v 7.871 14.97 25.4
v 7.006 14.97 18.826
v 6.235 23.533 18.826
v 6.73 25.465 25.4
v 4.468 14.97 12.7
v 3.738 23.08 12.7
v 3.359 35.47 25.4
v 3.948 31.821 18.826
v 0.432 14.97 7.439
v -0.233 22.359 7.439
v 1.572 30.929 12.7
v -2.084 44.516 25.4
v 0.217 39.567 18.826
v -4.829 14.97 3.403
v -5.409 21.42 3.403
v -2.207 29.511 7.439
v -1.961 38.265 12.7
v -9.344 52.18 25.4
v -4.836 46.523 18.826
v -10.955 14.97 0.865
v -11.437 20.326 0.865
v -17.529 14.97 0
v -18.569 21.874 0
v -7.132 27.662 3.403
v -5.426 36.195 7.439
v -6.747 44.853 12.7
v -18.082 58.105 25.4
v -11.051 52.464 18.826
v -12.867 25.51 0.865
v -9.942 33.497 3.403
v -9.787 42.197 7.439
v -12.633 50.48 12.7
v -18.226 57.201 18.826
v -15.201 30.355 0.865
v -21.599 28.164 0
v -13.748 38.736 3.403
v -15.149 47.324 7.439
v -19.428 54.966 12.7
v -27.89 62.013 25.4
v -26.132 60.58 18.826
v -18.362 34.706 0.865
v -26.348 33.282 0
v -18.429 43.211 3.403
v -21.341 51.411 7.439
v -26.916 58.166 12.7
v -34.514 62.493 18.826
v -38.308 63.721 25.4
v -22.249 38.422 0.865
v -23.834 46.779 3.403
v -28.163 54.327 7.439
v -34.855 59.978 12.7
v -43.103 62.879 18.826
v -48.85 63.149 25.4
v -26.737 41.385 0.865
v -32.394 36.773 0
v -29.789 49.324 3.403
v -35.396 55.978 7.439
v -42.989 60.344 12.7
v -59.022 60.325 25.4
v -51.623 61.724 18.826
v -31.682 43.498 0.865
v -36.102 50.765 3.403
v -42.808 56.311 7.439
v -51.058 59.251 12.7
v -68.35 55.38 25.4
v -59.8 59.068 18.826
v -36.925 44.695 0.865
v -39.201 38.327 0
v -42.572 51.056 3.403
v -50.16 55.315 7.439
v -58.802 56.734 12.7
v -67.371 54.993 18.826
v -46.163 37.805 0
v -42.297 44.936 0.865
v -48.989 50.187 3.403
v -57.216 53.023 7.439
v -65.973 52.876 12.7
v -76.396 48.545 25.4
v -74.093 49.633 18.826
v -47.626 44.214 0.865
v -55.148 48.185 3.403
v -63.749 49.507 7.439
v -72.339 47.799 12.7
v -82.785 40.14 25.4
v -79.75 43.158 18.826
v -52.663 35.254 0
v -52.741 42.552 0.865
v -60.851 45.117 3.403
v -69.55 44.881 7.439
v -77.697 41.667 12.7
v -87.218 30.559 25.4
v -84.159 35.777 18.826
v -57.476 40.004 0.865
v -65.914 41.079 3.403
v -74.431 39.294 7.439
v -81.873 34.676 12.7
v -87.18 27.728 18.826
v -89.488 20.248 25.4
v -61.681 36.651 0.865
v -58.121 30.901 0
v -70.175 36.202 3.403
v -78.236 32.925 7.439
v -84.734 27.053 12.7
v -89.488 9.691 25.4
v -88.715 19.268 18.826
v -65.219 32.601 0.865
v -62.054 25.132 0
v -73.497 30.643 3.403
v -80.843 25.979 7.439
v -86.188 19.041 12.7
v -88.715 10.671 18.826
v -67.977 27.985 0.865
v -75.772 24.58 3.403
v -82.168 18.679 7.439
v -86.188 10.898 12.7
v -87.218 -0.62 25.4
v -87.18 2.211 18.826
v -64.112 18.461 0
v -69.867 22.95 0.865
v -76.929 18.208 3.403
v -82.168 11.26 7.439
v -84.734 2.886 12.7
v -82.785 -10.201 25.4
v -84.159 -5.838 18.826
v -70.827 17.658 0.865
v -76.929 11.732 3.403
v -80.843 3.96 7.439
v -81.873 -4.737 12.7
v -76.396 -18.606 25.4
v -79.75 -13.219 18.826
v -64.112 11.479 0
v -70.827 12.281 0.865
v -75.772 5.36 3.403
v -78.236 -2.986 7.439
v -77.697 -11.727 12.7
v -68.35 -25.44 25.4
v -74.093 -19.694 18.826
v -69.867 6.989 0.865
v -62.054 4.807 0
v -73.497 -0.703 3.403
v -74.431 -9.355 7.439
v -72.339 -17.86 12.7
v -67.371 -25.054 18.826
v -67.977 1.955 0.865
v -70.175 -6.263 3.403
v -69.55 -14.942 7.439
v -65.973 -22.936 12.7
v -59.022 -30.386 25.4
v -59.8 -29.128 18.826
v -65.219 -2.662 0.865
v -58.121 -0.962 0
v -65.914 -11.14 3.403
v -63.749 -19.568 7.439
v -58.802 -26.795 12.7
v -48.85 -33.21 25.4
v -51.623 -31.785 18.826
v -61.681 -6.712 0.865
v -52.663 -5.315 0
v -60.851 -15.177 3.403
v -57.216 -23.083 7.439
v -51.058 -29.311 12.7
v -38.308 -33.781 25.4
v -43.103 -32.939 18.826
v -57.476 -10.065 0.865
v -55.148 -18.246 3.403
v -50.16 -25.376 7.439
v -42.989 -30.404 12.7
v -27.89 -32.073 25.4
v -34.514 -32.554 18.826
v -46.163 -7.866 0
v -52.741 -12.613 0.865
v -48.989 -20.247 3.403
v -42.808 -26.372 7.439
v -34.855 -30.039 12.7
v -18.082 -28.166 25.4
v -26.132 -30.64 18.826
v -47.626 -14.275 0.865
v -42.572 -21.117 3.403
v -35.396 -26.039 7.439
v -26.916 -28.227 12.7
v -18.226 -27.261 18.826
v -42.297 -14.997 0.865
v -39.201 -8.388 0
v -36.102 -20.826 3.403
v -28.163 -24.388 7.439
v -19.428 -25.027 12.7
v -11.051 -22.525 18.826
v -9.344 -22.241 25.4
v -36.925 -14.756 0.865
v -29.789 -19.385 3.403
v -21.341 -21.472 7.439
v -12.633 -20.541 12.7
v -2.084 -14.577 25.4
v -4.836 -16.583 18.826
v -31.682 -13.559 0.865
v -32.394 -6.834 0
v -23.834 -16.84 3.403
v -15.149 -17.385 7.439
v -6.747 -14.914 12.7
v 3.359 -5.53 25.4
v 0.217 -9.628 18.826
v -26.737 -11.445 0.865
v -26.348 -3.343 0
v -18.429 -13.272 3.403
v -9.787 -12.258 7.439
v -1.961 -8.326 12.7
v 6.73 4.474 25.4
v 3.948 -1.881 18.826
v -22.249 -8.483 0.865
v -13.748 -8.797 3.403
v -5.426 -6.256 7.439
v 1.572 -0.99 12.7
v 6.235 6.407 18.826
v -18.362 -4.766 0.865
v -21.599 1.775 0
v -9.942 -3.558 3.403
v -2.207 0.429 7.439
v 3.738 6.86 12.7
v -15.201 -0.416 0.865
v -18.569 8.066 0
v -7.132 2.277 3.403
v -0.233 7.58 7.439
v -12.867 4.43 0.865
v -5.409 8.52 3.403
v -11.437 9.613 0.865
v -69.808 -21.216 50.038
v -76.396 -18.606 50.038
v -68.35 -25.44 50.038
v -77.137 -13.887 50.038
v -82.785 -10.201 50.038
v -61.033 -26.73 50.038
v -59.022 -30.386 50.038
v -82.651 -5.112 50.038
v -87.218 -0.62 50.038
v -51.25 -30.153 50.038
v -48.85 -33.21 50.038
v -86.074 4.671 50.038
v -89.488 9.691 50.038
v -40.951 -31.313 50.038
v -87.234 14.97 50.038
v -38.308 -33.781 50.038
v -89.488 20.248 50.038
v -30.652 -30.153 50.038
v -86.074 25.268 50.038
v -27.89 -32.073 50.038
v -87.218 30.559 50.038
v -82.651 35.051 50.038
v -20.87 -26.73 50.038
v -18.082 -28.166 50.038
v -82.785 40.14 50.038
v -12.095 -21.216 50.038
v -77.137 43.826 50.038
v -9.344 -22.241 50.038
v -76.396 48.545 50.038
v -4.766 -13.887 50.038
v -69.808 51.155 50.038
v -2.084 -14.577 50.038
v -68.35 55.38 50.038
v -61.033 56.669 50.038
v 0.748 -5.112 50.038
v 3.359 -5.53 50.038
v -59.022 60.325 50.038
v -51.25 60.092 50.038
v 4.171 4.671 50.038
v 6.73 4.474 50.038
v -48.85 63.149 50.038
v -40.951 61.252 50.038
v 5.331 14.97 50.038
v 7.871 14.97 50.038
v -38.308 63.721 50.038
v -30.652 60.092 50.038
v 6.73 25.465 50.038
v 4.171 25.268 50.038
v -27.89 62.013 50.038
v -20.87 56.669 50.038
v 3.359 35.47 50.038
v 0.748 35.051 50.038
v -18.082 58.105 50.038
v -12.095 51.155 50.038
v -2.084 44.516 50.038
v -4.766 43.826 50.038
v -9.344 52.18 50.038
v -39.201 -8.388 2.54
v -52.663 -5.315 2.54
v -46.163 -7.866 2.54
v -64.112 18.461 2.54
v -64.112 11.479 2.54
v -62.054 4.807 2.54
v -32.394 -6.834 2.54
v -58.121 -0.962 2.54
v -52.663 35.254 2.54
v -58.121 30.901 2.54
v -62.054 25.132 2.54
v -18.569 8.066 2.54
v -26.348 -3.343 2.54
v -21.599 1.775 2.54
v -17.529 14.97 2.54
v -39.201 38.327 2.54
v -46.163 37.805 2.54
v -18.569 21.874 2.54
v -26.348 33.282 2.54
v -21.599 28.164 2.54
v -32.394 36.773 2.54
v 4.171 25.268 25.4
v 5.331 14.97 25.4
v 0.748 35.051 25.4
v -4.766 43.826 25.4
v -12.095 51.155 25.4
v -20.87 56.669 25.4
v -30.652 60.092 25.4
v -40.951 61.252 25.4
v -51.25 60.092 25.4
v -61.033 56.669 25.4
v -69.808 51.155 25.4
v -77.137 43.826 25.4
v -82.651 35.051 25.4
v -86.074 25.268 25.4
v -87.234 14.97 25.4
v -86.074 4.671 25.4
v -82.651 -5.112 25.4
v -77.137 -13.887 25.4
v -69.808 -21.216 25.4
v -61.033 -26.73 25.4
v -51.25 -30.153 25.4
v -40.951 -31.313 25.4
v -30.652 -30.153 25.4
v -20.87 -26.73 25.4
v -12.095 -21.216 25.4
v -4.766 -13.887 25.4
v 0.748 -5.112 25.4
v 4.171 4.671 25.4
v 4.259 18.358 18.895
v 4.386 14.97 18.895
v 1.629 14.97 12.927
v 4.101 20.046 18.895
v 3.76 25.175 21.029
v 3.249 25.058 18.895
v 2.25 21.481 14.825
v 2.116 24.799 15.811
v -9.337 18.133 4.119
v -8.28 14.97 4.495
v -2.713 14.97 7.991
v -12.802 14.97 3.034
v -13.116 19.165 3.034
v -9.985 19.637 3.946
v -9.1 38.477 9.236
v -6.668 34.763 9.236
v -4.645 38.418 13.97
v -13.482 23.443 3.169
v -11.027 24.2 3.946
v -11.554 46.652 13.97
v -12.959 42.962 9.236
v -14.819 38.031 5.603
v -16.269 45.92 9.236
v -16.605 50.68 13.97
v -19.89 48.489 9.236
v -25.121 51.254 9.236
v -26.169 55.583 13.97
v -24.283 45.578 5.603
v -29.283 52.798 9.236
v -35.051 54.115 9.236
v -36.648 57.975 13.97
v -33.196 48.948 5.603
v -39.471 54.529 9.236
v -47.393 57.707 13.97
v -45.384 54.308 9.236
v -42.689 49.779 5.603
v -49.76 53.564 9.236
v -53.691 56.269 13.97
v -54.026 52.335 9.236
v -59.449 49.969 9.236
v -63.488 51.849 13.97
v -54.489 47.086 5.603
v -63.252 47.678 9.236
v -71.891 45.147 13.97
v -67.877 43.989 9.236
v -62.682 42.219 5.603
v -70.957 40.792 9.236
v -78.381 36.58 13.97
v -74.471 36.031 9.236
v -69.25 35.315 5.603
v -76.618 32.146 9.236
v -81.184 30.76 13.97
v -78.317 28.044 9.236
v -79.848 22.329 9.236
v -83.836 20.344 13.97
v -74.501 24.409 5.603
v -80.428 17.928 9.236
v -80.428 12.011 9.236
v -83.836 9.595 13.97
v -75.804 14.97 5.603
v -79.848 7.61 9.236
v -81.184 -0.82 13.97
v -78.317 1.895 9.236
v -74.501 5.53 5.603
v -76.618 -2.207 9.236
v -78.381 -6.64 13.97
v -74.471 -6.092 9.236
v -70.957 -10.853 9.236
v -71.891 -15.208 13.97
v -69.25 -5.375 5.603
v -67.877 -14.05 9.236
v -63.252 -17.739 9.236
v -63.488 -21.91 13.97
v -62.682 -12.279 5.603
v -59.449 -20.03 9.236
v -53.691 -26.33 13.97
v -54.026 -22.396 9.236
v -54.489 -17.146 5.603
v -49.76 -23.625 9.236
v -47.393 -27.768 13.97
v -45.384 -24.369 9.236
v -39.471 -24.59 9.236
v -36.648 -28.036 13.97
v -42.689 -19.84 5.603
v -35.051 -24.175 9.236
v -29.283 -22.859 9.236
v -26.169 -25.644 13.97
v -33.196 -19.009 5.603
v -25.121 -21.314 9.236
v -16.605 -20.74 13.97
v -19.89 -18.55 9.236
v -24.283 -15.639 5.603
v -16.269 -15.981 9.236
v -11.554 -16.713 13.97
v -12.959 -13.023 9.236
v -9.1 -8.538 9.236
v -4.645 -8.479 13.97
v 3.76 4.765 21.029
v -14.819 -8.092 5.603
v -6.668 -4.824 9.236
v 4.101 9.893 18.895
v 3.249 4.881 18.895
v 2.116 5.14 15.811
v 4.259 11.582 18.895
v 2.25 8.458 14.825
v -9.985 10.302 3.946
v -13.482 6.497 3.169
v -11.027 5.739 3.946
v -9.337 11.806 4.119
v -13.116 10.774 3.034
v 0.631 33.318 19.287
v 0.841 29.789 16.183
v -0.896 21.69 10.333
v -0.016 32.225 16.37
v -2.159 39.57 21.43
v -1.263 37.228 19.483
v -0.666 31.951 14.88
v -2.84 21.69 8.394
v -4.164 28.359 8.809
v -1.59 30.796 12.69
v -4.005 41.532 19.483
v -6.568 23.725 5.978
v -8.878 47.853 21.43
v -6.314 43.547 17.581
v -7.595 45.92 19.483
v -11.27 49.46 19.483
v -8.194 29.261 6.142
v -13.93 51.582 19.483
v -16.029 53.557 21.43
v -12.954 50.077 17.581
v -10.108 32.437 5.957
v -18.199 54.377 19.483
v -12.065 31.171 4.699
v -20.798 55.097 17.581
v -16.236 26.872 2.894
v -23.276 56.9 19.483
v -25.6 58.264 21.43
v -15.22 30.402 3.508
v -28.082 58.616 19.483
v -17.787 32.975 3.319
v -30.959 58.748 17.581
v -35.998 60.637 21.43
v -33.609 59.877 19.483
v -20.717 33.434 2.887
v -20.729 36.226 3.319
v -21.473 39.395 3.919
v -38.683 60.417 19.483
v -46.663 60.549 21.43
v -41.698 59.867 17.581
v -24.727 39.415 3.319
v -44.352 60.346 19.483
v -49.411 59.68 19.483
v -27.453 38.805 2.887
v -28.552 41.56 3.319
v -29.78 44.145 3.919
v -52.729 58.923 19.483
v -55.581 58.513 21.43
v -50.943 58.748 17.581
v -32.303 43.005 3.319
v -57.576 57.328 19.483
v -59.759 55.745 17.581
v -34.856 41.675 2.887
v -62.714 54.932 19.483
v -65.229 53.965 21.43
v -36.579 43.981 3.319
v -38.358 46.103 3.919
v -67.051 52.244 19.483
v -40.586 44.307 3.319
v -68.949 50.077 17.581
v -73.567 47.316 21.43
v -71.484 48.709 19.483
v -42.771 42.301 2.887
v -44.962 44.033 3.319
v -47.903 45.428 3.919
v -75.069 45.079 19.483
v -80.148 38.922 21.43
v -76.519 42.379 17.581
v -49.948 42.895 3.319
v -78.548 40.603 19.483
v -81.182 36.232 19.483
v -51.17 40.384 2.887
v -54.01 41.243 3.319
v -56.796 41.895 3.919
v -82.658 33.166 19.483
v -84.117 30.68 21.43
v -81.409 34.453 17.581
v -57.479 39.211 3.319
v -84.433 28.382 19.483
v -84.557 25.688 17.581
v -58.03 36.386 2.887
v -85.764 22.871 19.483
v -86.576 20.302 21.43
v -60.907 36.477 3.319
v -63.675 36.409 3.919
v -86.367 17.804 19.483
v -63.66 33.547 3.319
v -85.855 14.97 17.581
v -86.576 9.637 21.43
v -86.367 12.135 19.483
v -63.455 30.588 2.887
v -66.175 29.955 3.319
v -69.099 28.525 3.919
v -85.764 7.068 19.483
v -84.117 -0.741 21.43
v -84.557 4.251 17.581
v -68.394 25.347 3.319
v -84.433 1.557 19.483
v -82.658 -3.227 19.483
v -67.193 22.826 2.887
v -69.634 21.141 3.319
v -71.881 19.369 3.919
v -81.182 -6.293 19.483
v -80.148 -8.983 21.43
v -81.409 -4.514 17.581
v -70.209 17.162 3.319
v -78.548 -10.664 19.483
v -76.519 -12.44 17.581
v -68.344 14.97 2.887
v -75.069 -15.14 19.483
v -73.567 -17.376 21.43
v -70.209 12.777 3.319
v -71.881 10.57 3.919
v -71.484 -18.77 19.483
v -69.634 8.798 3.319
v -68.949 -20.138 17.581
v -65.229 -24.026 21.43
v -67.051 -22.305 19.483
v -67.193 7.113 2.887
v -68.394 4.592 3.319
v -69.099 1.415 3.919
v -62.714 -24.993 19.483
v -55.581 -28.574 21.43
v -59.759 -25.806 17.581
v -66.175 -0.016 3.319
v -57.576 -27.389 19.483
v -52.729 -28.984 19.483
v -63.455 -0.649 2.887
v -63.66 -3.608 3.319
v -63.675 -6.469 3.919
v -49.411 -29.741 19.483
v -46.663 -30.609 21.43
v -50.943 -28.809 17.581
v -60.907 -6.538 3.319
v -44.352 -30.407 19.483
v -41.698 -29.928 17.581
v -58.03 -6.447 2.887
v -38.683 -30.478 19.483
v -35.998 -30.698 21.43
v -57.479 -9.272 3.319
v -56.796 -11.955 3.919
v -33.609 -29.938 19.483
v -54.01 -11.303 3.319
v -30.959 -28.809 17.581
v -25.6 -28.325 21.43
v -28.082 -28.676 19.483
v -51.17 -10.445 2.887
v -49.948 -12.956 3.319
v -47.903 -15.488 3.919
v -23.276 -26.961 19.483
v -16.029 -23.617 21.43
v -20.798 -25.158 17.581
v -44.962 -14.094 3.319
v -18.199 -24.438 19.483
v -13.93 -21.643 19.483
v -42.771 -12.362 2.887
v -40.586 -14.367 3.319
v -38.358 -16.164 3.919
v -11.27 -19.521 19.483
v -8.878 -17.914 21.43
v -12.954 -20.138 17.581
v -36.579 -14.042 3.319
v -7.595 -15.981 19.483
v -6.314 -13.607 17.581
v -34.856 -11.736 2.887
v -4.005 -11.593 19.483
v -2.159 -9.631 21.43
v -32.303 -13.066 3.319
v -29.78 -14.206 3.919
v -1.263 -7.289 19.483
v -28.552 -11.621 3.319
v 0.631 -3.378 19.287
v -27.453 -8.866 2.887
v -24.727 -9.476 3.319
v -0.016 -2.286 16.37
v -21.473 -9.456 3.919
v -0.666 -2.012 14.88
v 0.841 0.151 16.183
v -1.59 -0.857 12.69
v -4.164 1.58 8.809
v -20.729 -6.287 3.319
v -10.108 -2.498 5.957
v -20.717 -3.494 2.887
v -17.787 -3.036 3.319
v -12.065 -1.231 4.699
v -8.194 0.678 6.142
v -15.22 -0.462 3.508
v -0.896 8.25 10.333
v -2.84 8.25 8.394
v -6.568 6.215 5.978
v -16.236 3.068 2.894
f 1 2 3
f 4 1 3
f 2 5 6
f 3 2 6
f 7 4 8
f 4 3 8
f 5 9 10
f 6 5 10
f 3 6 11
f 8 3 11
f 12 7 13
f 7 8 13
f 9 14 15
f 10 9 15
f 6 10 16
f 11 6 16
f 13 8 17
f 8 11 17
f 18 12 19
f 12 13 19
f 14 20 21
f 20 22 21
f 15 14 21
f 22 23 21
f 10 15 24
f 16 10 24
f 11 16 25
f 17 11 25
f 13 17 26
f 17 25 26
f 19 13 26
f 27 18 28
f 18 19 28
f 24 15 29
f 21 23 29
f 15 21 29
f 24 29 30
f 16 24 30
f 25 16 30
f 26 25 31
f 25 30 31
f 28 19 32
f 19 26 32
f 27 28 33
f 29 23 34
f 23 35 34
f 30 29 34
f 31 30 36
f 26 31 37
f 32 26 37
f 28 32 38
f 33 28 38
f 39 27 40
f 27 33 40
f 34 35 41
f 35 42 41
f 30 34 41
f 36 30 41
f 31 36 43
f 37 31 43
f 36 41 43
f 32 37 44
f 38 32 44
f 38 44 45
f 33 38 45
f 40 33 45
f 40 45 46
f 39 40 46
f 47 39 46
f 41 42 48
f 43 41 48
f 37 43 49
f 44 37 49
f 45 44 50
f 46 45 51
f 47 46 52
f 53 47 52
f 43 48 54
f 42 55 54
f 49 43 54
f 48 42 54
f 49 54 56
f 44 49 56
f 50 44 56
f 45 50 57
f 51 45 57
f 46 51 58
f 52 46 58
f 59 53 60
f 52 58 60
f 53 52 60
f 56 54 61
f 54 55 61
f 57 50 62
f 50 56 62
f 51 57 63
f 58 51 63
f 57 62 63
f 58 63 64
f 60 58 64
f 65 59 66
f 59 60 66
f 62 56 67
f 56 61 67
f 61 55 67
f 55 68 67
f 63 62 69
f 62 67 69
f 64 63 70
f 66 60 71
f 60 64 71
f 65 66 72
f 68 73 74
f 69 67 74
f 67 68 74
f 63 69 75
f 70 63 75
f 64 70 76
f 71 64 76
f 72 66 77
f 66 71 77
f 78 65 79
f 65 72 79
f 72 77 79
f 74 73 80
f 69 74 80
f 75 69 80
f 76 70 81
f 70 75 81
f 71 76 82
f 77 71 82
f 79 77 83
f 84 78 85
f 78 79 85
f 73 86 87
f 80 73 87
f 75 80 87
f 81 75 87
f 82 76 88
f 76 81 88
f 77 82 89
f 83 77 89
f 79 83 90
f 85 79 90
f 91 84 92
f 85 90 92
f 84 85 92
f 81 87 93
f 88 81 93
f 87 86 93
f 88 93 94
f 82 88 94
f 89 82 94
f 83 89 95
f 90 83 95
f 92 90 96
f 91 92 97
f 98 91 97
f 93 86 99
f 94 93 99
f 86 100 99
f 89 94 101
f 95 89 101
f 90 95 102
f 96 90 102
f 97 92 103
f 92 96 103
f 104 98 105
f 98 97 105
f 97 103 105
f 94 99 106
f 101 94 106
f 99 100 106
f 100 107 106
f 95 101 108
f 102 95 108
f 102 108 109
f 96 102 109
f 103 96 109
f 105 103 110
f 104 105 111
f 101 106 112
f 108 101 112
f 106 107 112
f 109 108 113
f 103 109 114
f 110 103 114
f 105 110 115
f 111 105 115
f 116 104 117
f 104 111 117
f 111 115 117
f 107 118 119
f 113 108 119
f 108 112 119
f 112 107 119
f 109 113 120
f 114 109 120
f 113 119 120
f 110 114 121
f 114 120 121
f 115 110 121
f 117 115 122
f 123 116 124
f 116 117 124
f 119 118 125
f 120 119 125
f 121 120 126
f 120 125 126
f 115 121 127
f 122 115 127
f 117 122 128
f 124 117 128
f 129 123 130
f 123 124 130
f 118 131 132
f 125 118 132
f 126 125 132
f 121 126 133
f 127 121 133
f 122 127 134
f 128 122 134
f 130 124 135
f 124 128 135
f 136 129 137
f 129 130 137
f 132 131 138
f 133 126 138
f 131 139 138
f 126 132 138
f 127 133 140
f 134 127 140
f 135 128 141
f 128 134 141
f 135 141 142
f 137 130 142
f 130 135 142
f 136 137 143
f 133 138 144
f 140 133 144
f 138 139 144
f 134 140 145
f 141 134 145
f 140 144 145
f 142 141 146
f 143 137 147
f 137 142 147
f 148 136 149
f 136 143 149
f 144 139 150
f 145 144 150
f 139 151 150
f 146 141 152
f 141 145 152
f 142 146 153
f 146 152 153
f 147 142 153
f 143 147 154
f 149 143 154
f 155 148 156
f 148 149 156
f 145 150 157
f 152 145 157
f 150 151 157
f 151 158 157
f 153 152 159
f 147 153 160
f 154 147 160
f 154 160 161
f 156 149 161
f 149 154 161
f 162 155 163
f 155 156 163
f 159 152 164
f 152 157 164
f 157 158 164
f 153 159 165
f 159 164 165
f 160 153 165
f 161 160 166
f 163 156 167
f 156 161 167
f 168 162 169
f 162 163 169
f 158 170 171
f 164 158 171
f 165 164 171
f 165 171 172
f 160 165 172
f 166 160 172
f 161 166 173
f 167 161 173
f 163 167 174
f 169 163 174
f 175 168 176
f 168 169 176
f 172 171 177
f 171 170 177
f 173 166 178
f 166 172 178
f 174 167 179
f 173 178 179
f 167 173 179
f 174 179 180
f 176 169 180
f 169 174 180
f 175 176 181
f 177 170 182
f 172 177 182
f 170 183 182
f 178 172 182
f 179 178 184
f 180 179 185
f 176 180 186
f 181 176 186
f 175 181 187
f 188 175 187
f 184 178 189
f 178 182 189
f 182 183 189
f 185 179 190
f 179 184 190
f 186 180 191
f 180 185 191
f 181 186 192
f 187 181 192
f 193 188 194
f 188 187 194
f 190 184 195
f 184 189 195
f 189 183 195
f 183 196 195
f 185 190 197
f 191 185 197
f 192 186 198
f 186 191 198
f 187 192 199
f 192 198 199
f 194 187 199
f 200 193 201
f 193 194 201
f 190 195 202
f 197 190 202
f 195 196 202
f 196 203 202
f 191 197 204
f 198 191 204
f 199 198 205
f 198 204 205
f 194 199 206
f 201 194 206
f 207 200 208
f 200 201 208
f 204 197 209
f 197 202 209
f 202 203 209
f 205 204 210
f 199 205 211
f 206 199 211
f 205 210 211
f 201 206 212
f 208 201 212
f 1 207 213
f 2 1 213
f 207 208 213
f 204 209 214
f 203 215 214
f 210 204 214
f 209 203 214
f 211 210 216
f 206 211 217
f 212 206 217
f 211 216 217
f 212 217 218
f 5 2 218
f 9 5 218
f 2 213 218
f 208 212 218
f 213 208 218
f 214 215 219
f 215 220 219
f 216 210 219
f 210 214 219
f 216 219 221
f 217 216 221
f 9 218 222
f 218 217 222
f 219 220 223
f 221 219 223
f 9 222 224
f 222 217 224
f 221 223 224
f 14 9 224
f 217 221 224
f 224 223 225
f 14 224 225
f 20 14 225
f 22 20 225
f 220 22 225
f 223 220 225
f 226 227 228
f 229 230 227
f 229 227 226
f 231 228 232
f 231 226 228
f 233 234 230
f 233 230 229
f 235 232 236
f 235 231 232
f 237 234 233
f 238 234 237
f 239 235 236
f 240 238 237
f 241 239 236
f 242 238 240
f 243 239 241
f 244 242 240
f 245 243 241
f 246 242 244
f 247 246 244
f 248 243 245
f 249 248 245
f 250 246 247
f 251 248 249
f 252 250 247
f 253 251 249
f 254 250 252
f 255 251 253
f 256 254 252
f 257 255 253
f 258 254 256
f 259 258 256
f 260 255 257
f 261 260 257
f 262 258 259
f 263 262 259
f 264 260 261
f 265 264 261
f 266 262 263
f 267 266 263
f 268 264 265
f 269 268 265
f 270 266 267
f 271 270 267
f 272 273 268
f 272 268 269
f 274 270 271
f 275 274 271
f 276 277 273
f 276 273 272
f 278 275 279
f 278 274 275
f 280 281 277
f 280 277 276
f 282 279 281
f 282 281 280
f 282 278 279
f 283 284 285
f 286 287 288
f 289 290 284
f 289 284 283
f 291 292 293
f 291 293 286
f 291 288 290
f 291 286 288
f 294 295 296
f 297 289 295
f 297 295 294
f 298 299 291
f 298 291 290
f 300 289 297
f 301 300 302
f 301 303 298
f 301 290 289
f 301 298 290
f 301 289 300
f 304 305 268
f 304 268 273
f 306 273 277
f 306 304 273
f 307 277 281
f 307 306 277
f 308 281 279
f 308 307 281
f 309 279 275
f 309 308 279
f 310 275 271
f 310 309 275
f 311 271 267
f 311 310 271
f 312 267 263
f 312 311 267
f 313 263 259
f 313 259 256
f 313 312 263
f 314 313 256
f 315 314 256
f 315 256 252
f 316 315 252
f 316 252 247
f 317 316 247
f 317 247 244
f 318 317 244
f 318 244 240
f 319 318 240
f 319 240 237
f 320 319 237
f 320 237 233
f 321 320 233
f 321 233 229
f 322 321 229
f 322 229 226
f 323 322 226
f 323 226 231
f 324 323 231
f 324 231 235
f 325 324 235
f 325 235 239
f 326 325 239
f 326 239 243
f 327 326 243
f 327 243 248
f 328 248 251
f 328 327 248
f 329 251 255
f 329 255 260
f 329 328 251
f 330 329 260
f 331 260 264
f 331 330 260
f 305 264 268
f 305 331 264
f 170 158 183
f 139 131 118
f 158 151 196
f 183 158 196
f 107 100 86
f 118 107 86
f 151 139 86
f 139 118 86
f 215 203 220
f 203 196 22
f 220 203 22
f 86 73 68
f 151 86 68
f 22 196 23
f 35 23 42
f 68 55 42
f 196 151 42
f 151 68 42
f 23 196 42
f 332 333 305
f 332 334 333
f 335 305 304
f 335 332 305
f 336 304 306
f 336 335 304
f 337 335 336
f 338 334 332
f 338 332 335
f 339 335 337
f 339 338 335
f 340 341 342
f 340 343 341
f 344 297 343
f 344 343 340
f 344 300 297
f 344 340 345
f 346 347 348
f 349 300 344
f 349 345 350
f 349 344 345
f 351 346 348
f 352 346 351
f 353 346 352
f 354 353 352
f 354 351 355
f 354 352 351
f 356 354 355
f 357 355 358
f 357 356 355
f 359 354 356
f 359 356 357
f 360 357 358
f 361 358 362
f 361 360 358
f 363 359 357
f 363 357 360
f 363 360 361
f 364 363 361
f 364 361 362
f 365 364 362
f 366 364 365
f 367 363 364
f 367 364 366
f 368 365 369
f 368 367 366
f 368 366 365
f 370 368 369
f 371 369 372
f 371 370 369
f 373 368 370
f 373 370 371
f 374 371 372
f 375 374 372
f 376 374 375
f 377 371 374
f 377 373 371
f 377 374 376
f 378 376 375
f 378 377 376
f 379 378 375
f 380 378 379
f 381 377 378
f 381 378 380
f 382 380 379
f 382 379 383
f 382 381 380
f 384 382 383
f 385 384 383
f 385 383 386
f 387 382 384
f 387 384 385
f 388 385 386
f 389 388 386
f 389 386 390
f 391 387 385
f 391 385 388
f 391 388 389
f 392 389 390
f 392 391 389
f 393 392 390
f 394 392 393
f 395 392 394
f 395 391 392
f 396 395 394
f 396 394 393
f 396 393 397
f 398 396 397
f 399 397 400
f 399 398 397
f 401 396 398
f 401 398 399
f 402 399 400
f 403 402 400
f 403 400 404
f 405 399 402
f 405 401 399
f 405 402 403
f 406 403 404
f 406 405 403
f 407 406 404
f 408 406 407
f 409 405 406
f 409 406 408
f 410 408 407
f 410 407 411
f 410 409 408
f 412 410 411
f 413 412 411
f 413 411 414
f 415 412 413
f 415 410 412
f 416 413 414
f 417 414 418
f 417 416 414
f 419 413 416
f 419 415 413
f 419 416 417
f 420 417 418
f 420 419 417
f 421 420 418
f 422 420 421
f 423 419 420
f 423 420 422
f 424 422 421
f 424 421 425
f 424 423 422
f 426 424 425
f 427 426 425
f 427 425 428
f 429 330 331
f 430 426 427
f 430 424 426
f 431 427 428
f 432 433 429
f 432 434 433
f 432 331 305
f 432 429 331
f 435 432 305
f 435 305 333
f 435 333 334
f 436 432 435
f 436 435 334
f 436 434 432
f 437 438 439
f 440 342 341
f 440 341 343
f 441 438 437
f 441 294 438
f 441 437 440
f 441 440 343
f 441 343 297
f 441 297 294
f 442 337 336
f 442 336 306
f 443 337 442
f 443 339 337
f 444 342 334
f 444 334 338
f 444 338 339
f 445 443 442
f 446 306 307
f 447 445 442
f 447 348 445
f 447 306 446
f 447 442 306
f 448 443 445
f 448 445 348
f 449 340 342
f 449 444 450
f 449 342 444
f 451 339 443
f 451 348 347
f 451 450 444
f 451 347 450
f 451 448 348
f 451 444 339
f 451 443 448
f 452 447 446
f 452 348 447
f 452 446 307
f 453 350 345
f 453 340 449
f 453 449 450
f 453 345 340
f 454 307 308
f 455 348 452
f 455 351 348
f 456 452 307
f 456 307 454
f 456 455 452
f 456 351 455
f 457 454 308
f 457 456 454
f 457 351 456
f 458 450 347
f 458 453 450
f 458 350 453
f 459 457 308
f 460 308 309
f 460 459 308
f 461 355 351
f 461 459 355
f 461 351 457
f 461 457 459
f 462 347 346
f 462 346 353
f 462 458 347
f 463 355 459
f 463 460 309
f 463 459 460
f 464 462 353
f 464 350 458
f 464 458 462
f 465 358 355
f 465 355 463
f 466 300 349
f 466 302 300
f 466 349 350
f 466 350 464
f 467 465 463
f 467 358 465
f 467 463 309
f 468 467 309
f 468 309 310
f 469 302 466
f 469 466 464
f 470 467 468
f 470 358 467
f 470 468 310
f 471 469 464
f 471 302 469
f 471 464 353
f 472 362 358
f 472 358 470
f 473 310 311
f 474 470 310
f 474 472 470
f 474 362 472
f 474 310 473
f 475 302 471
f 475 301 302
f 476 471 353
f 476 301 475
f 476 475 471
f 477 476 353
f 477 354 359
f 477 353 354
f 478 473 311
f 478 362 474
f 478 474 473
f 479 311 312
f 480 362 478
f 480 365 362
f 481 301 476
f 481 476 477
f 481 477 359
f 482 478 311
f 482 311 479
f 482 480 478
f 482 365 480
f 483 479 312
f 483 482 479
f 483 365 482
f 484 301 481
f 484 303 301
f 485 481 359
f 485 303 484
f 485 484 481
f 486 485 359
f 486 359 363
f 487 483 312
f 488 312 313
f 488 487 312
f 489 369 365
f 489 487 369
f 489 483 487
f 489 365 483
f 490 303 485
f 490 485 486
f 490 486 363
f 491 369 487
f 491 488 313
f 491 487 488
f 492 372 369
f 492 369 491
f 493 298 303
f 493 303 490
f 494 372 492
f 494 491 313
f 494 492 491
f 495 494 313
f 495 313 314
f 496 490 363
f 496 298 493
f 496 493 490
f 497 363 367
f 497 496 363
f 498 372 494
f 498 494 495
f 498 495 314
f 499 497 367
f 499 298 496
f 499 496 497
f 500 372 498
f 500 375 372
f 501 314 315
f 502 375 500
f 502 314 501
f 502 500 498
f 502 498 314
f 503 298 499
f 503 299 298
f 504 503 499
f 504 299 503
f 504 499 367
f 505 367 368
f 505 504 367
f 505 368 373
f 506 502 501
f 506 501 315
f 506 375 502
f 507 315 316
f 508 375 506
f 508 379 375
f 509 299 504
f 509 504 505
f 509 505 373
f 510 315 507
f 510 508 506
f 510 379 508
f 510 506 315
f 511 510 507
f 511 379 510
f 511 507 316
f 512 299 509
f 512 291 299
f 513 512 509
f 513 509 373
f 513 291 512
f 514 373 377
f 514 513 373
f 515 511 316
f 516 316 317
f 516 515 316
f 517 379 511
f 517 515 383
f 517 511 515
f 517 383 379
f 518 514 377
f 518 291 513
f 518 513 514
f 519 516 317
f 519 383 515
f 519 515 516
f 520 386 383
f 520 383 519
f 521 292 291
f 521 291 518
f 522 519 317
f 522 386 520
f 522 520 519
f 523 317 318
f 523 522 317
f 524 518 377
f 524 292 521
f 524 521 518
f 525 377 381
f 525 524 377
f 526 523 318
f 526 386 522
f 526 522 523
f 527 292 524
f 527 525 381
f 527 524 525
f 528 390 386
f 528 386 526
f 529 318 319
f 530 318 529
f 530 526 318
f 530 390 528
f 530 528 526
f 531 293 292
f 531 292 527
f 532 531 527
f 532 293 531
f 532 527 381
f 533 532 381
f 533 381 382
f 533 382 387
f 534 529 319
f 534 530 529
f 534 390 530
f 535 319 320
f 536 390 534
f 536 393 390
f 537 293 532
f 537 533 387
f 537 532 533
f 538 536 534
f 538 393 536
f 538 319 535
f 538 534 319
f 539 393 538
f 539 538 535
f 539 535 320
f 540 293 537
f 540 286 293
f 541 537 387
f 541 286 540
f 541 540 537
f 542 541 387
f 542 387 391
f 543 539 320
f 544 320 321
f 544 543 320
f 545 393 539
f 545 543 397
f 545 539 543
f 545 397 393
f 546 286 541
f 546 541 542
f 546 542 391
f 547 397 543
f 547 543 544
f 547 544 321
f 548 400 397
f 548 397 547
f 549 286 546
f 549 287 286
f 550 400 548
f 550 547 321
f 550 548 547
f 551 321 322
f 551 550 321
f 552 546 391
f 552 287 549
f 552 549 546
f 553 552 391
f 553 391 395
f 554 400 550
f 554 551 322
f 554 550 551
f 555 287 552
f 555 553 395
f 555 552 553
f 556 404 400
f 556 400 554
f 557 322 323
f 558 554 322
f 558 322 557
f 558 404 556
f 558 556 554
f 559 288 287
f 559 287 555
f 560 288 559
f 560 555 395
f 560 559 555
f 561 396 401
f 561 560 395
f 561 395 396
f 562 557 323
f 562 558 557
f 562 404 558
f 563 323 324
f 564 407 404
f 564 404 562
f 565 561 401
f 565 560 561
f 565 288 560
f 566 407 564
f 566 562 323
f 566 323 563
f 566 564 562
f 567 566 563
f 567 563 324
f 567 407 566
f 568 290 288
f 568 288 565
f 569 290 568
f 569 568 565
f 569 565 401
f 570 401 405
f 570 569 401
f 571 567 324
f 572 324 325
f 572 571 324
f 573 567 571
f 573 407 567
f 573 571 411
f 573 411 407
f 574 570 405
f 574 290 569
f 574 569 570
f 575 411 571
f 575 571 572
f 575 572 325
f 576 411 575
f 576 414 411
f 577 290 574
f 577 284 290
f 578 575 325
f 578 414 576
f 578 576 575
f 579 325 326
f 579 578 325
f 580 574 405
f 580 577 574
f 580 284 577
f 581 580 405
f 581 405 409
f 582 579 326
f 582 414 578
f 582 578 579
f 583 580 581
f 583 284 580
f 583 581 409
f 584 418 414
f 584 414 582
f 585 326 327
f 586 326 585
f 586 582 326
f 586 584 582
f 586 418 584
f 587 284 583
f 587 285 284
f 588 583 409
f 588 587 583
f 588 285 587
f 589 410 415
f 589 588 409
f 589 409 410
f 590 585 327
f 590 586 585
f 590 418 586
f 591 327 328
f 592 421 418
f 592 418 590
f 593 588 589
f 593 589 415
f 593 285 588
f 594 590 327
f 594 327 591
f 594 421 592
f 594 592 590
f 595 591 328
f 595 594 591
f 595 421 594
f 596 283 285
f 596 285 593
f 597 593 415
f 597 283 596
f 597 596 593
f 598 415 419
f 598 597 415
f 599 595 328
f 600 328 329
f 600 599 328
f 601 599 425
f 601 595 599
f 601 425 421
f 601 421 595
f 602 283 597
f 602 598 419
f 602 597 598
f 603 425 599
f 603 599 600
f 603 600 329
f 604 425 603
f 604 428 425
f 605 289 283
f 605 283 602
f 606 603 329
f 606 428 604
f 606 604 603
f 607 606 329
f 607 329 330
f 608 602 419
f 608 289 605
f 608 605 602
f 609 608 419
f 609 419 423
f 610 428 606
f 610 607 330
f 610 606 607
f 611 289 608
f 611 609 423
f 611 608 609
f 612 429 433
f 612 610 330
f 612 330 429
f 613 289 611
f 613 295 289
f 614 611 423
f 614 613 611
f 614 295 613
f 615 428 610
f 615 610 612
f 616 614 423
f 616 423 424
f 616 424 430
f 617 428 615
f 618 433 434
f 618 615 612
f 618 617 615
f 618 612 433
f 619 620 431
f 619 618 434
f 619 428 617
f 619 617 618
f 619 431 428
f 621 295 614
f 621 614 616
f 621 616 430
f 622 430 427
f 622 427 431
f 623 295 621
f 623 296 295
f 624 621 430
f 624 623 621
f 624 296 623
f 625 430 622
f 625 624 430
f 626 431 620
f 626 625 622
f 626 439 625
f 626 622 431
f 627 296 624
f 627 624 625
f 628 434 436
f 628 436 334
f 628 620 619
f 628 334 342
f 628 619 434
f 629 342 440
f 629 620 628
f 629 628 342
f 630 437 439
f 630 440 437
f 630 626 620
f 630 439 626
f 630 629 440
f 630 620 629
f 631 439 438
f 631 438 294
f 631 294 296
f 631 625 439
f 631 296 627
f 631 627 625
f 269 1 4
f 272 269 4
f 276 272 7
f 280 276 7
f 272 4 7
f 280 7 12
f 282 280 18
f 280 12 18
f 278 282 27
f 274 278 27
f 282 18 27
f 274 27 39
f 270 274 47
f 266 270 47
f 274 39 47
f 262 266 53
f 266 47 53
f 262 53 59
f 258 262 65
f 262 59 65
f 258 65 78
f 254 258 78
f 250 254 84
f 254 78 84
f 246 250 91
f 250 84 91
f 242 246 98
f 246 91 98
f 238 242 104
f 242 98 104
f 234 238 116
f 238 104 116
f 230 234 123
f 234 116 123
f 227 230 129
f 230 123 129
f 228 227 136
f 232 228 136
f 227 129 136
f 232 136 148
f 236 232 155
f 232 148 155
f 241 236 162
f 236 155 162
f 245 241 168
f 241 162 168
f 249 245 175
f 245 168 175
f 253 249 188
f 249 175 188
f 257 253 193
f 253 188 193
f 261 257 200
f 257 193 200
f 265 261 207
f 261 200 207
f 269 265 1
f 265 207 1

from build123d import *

# Parameters (mm, degrees)
F0_R     = 48.822683
F1_DEPTH = 50.038
F2_R     = 25.4
F3_T     = -2.54


with BuildPart() as f1:
    # F0 (on Top) → F1 (new body)
    with BuildSketch(Plane.XY):
        with Locations((-40.951356, 14.969614)):
            Circle(F0_R)
    extrude(amount=F1_DEPTH)

    # F2
    f2_edges = [f1.edges().sort_by_distance(p)[0] for p in [
        (-89.774039, 14.969614, 0),
    ]]
    fillet(f2_edges, radius=F2_R)

    # F3
    f3_openings = [f1.faces().sort_by_distance(p)[0] for p in [
        (-40.951356, 14.969614, 50.038),
    ]]
    offset(amount=F3_T, openings=f3_openings)


solid = f1.part
